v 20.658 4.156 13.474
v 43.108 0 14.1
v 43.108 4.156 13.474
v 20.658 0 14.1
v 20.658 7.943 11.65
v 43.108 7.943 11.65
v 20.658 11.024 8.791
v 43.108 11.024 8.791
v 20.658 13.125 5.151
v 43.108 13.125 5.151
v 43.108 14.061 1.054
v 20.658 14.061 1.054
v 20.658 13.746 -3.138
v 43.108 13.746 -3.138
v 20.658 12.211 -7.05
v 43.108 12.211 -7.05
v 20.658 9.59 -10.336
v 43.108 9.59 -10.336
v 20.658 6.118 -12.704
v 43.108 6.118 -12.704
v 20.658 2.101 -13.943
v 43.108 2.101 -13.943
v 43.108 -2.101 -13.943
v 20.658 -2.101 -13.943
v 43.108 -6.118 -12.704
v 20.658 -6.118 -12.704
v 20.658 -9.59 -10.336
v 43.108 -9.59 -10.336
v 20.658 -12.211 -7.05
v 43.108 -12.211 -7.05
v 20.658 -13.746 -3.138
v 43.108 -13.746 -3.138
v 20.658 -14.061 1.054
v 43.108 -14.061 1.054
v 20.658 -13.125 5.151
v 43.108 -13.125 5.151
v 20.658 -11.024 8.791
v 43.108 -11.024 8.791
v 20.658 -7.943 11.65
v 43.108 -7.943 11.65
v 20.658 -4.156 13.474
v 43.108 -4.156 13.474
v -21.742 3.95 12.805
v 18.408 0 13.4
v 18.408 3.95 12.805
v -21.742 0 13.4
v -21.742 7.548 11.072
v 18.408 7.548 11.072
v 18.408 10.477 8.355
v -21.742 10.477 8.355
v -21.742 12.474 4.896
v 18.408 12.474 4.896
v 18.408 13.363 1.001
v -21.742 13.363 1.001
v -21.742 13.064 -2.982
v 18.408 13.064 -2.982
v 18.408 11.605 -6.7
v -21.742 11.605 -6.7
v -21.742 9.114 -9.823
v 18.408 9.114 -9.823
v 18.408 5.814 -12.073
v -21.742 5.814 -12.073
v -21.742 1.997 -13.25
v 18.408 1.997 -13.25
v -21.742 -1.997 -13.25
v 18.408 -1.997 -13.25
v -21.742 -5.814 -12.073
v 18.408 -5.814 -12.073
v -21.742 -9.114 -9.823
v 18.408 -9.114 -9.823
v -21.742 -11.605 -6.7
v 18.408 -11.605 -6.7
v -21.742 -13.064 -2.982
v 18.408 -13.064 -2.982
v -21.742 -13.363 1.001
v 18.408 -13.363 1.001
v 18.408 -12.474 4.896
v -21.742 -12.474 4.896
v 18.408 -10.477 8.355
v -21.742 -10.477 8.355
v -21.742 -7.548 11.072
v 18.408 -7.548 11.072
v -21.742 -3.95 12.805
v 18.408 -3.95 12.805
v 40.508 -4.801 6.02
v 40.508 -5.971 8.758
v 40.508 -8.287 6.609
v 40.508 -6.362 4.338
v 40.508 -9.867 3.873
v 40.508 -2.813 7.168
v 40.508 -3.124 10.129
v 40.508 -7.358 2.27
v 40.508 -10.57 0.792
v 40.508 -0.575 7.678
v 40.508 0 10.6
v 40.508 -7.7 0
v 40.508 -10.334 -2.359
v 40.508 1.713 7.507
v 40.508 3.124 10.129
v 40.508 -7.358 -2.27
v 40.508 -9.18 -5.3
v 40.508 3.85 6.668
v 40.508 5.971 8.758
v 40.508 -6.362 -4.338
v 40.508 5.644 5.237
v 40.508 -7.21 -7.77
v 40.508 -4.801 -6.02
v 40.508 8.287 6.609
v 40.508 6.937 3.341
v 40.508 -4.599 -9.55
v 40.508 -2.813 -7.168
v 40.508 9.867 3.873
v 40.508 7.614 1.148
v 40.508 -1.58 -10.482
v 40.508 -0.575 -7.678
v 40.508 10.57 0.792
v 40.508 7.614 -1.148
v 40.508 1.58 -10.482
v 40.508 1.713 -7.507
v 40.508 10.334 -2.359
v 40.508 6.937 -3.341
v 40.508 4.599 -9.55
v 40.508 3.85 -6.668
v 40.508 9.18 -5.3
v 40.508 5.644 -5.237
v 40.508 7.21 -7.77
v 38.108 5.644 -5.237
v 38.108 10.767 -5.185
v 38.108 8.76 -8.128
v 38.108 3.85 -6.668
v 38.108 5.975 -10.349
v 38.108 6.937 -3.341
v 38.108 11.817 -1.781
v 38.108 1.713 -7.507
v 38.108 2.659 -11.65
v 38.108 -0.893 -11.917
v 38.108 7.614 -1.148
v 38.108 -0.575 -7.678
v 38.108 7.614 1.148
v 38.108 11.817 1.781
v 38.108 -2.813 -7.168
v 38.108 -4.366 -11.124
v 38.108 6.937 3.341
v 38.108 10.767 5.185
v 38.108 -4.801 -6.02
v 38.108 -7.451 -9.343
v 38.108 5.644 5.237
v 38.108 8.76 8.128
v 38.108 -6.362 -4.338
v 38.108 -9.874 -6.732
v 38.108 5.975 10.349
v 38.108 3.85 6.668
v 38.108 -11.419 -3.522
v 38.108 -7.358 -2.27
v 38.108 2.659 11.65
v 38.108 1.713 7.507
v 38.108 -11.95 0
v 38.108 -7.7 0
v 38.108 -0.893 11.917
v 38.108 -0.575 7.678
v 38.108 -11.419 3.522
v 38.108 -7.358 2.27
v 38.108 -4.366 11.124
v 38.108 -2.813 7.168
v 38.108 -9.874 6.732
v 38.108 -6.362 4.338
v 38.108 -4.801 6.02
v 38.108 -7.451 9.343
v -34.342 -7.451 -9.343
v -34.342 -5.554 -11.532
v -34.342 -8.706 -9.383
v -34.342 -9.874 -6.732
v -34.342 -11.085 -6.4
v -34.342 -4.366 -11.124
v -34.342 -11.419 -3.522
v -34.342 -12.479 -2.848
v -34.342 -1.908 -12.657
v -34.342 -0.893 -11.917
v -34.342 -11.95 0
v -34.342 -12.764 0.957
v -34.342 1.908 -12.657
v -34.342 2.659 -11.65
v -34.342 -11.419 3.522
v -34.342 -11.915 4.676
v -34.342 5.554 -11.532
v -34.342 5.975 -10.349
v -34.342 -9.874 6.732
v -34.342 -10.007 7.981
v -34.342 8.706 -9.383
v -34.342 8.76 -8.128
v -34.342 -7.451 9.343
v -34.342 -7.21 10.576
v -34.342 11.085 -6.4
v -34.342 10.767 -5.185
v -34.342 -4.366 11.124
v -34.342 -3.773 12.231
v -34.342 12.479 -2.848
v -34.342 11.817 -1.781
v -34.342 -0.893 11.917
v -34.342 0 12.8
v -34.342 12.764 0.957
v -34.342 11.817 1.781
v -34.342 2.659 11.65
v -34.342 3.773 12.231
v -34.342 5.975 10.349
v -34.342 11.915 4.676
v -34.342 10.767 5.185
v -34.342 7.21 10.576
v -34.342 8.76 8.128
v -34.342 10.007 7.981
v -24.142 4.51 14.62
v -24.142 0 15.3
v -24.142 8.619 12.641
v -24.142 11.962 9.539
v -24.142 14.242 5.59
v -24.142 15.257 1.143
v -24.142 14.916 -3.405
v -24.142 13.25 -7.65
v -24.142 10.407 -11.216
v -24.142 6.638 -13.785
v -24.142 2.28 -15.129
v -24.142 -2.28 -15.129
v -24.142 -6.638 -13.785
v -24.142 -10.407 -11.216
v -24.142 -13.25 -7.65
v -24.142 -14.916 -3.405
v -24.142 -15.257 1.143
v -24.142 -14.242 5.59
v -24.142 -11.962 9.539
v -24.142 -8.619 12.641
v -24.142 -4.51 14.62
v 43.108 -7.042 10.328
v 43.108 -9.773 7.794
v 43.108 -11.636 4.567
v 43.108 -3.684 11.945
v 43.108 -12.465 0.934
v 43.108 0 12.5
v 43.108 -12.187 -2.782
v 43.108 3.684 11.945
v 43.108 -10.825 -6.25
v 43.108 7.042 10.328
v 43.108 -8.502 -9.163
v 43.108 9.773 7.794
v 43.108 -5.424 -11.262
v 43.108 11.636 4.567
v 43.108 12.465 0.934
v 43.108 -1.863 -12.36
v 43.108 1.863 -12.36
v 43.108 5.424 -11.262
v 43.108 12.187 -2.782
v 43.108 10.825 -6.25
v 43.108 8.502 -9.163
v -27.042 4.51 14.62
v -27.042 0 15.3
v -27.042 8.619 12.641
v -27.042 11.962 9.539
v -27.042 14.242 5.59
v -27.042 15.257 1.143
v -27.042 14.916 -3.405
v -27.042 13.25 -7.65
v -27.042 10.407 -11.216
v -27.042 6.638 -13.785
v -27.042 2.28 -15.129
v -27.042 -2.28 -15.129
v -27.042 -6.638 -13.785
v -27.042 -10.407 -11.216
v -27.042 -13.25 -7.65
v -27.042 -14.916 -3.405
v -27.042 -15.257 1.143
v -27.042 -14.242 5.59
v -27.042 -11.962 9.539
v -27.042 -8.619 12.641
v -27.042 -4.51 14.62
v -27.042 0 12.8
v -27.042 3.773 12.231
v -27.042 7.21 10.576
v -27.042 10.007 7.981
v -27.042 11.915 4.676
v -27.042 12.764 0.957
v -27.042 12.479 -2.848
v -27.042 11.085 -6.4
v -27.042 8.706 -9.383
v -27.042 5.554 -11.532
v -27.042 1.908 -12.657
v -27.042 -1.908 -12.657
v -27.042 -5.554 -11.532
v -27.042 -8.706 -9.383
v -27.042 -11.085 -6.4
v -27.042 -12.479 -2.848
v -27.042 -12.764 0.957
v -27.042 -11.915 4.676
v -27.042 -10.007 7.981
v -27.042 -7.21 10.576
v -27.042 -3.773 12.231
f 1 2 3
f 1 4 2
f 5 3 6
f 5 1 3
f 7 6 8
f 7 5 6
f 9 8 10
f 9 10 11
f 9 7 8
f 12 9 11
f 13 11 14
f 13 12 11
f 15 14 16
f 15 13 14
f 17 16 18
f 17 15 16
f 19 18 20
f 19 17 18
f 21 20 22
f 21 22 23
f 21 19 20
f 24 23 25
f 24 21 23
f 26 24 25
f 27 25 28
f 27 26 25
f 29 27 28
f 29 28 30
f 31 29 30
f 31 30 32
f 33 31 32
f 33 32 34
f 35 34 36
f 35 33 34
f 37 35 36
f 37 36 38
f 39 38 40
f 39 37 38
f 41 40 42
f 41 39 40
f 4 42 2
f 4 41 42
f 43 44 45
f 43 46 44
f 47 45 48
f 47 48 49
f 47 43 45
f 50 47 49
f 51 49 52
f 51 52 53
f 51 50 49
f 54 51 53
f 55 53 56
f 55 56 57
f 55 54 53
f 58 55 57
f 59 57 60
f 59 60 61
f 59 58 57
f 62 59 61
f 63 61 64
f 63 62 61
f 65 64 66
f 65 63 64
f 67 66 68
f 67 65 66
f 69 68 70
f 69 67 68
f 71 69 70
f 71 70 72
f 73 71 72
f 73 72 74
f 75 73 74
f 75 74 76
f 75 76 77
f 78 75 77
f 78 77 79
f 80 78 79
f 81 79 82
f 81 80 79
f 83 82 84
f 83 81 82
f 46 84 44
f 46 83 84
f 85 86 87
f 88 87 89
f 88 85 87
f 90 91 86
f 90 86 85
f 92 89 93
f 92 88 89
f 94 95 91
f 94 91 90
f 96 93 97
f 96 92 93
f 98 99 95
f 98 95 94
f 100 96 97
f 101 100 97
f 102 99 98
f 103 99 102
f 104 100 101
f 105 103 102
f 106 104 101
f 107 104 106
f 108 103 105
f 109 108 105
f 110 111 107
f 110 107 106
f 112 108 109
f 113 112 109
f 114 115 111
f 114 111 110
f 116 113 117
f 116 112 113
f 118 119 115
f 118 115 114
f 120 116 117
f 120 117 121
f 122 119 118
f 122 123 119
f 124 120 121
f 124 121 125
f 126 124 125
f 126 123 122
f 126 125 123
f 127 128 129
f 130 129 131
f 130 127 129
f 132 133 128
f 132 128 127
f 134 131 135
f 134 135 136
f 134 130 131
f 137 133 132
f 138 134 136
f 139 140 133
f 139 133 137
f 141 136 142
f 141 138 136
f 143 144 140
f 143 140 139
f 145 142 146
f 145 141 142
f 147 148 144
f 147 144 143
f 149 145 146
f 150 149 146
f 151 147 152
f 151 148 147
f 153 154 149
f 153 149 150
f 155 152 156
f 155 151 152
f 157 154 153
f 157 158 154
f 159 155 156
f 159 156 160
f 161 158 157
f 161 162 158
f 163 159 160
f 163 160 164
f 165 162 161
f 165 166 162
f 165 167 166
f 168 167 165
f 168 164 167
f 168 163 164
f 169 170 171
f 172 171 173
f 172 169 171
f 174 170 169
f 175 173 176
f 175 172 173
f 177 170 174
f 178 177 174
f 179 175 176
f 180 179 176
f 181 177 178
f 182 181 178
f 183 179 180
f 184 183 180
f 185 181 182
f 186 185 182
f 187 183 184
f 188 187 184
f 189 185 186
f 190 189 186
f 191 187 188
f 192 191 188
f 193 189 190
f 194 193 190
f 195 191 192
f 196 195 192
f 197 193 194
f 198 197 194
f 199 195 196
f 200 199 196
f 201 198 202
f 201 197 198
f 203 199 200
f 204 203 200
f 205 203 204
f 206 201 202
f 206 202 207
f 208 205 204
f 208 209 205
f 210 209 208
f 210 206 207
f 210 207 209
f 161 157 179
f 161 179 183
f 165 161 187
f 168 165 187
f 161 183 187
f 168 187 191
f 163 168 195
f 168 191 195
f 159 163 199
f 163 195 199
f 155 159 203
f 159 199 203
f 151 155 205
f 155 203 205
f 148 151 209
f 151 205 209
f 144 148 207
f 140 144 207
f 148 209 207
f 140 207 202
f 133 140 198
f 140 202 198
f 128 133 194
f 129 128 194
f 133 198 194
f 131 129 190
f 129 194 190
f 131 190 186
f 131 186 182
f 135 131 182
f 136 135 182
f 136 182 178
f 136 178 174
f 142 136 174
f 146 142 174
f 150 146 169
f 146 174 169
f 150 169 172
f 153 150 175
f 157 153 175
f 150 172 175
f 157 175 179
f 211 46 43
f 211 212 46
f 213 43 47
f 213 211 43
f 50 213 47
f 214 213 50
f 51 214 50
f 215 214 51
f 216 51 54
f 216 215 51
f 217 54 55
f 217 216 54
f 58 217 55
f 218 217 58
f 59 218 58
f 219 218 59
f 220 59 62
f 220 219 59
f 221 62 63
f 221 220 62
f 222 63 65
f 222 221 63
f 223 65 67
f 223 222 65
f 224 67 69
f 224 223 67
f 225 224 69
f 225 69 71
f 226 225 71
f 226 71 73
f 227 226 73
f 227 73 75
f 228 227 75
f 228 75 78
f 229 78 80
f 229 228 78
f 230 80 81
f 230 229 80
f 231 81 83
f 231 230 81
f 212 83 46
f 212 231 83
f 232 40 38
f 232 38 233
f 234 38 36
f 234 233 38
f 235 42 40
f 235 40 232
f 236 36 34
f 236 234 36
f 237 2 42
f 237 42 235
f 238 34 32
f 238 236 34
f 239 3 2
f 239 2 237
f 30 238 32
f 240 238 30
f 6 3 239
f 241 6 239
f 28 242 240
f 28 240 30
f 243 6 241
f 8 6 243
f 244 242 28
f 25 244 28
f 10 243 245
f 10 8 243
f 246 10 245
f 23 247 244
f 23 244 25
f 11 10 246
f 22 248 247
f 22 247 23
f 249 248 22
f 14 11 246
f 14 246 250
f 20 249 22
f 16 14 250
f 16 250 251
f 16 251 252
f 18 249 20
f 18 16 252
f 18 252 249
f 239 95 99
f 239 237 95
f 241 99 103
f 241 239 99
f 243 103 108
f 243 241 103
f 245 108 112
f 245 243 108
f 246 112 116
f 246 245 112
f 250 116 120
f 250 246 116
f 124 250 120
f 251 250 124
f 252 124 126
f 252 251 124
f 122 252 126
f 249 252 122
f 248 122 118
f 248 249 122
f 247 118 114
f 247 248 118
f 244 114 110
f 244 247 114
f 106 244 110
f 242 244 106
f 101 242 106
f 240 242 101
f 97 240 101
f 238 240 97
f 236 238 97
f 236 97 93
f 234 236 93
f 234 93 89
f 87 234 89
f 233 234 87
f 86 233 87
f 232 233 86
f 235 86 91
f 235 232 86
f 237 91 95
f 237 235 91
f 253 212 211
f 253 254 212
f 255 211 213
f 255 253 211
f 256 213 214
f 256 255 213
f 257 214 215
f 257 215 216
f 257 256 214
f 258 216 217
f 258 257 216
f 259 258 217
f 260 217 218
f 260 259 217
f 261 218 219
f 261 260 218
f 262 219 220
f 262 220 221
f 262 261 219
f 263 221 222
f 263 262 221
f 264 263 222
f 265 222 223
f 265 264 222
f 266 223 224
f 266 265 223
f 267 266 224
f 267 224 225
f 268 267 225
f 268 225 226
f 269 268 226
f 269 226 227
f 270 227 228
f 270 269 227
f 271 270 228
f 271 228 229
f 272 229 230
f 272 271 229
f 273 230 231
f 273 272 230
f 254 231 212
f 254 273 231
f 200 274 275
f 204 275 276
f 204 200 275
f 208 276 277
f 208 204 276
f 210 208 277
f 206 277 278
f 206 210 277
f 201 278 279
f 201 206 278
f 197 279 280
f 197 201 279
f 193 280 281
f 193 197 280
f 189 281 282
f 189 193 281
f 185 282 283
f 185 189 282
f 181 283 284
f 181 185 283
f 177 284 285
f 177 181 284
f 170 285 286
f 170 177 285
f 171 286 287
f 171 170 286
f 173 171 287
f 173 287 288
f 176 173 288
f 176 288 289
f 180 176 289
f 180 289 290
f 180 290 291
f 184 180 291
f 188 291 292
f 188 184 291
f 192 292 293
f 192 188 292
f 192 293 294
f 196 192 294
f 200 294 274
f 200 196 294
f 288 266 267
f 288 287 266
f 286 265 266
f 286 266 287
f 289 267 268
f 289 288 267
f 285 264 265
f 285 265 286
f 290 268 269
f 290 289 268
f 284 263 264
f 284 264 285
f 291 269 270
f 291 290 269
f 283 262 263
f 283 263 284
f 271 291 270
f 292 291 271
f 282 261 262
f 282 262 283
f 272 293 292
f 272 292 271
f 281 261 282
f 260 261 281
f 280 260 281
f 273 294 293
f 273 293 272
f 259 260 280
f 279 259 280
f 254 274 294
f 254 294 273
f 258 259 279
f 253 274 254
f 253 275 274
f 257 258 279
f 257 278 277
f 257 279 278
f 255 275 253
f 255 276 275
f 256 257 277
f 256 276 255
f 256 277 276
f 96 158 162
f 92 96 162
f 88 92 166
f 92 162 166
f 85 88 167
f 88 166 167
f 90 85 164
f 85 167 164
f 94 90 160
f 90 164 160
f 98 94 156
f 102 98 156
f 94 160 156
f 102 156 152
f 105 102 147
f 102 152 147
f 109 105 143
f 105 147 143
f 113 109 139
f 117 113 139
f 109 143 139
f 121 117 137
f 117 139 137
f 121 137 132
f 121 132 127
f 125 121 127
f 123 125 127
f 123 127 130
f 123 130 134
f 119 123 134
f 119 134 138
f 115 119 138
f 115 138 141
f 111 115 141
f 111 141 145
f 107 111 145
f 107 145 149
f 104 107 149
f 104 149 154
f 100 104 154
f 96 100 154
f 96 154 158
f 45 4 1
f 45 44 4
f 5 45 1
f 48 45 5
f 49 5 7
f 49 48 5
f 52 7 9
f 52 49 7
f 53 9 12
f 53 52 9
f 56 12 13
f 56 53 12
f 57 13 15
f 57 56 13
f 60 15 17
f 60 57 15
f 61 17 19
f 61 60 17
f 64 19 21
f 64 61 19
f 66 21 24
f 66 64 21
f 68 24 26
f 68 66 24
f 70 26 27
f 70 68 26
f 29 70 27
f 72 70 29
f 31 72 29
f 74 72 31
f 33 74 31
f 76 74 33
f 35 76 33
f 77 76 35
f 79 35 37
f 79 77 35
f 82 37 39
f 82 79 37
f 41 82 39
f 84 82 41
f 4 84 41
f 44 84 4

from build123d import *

# Parameters (mm, degrees)
F2_R     = 11.95
F3_DEPTH = 72.45
F4_R     = 7.7
F5_DEPTH = 5.001


with BuildPart() as f1:
    # F0 (on Front) → F1 (revolve)
    with BuildSketch(Plane.XZ):
        Polygon((-34.341893, 12.8), (-34.341893, 0), (40.508107, 0), (40.508107, 10.6), (43.108107, 12.5), (43.108107, 14.1), (20.658107, 14.1), (18.408107, 13.4), (-21.741893, 13.4), (-24.141893, 15.3), (-27.041893, 15.3), (-27.041893, 12.8), align=None)
    revolve(axis=Axis((3.083107, 0, 0), (-1, 0, 0)))

    # F2 (on face) → F3 (cut)
    with BuildSketch(Plane(origin=(-34.341893, 0, 0), x_dir=(0, -1, 0), z_dir=(-1, 0, 0))):
        Circle(F2_R)
    extrude(amount=-F3_DEPTH, mode=Mode.SUBTRACT)

    # F4 (on face) → F5 (cut, through all)
    with BuildSketch(Plane(origin=(38.108107, 0, 0), x_dir=(0, -1, 0), z_dir=(-1, 0, 0))):
        Circle(F4_R)
    extrude(amount=-F5_DEPTH, mode=Mode.SUBTRACT)


solid = f1.part
